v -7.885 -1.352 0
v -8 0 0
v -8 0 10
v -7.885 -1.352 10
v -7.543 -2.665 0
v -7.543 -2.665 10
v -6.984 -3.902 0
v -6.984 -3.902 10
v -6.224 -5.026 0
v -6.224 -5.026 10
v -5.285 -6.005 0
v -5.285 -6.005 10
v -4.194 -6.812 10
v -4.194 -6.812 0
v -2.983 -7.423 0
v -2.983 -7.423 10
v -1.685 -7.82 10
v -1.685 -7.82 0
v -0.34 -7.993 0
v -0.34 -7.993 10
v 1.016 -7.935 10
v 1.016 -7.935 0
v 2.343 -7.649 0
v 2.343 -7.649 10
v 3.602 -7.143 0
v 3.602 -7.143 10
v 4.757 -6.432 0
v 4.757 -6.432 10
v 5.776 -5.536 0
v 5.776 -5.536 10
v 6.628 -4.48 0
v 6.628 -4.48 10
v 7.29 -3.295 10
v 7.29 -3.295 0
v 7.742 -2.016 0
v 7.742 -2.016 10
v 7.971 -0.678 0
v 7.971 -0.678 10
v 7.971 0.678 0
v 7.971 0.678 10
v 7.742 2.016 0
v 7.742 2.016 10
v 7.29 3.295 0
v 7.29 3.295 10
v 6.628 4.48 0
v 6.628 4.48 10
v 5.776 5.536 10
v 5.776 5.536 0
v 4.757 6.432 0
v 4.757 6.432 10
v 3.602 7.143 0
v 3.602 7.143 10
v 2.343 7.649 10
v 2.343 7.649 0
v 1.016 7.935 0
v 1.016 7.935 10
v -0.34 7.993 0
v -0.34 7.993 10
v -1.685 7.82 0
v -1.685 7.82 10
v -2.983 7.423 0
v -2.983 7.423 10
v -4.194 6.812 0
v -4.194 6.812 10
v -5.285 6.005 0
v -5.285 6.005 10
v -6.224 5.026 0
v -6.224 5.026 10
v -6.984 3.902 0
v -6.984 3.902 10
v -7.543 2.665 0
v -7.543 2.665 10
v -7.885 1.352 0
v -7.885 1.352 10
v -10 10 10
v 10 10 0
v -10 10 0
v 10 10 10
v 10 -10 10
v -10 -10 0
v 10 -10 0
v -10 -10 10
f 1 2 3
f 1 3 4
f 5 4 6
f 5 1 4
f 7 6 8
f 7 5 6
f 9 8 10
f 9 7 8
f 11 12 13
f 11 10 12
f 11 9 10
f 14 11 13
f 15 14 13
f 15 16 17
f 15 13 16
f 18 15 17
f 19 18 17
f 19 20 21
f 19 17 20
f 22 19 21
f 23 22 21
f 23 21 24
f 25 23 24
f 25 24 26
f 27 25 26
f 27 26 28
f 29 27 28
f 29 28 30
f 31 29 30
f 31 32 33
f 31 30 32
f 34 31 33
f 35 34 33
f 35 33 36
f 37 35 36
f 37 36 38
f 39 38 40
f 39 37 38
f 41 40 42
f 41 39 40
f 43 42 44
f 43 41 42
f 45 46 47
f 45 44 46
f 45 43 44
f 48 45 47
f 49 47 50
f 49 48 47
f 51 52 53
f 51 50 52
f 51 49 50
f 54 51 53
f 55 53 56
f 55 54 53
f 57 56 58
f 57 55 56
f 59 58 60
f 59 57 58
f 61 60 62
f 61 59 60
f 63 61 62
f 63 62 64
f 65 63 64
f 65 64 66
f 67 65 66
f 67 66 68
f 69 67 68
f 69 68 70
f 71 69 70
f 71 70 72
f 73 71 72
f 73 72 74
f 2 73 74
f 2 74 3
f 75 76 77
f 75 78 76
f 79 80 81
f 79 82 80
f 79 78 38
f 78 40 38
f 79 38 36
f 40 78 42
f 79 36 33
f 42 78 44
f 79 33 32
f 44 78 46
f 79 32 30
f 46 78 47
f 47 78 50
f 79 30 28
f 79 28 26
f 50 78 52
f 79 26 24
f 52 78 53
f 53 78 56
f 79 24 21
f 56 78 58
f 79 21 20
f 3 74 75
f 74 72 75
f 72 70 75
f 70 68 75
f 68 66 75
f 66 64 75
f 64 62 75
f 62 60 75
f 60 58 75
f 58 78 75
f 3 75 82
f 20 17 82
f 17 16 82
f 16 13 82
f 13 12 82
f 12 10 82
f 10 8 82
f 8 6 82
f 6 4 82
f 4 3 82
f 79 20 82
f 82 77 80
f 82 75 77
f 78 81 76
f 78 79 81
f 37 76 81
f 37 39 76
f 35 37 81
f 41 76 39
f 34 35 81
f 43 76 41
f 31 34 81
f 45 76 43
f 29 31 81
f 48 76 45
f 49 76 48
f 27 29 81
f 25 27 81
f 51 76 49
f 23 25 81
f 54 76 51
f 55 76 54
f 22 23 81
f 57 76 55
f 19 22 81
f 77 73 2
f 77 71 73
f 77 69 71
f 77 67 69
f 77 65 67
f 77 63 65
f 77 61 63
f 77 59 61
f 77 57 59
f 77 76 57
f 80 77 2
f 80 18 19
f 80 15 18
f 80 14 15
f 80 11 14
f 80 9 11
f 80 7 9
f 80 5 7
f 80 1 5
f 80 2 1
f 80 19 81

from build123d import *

# Parameters (mm, degrees)
CUT_EXTRUDE1_DEPTH      = 18.320508249
CUT_EXTRUDE1_DEPTH_BACK = 18.320508249
SKETCH3_R               = 8


with BuildPart() as part:
    # Sketch1 → Loft1 section 0
    with BuildSketch(Plane.XY):
        with BuildLine():
            Line((10, 10), (-10, 10))
            Line((-10, 10), (-10, -10))
            Line((-10, -10), (10, -10))
            Line((10, -10), (10, 10))
        make_face()
    # Sketch2 → Loft1 section 1
    with BuildSketch(Plane.XY.offset(10)):
        with BuildLine():
            Line((10, 10), (-10, 10))
            Line((-10, 10), (-10, -10))
            Line((-10, -10), (10, -10))
            Line((10, -10), (10, 10))
        make_face()
    loft()

    # Sketch3 → Cut-Extrude1 (cut, two sides: drawn at the far end of the back side and taken through both)
    with BuildSketch(Plane.XY.offset(-CUT_EXTRUDE1_DEPTH_BACK)):
        with Locations(Location((0, 0, 0), (0, 0, 180))):
            Circle(SKETCH3_R)
    extrude(amount=CUT_EXTRUDE1_DEPTH + CUT_EXTRUDE1_DEPTH_BACK, mode=Mode.SUBTRACT)


solid = part.part
